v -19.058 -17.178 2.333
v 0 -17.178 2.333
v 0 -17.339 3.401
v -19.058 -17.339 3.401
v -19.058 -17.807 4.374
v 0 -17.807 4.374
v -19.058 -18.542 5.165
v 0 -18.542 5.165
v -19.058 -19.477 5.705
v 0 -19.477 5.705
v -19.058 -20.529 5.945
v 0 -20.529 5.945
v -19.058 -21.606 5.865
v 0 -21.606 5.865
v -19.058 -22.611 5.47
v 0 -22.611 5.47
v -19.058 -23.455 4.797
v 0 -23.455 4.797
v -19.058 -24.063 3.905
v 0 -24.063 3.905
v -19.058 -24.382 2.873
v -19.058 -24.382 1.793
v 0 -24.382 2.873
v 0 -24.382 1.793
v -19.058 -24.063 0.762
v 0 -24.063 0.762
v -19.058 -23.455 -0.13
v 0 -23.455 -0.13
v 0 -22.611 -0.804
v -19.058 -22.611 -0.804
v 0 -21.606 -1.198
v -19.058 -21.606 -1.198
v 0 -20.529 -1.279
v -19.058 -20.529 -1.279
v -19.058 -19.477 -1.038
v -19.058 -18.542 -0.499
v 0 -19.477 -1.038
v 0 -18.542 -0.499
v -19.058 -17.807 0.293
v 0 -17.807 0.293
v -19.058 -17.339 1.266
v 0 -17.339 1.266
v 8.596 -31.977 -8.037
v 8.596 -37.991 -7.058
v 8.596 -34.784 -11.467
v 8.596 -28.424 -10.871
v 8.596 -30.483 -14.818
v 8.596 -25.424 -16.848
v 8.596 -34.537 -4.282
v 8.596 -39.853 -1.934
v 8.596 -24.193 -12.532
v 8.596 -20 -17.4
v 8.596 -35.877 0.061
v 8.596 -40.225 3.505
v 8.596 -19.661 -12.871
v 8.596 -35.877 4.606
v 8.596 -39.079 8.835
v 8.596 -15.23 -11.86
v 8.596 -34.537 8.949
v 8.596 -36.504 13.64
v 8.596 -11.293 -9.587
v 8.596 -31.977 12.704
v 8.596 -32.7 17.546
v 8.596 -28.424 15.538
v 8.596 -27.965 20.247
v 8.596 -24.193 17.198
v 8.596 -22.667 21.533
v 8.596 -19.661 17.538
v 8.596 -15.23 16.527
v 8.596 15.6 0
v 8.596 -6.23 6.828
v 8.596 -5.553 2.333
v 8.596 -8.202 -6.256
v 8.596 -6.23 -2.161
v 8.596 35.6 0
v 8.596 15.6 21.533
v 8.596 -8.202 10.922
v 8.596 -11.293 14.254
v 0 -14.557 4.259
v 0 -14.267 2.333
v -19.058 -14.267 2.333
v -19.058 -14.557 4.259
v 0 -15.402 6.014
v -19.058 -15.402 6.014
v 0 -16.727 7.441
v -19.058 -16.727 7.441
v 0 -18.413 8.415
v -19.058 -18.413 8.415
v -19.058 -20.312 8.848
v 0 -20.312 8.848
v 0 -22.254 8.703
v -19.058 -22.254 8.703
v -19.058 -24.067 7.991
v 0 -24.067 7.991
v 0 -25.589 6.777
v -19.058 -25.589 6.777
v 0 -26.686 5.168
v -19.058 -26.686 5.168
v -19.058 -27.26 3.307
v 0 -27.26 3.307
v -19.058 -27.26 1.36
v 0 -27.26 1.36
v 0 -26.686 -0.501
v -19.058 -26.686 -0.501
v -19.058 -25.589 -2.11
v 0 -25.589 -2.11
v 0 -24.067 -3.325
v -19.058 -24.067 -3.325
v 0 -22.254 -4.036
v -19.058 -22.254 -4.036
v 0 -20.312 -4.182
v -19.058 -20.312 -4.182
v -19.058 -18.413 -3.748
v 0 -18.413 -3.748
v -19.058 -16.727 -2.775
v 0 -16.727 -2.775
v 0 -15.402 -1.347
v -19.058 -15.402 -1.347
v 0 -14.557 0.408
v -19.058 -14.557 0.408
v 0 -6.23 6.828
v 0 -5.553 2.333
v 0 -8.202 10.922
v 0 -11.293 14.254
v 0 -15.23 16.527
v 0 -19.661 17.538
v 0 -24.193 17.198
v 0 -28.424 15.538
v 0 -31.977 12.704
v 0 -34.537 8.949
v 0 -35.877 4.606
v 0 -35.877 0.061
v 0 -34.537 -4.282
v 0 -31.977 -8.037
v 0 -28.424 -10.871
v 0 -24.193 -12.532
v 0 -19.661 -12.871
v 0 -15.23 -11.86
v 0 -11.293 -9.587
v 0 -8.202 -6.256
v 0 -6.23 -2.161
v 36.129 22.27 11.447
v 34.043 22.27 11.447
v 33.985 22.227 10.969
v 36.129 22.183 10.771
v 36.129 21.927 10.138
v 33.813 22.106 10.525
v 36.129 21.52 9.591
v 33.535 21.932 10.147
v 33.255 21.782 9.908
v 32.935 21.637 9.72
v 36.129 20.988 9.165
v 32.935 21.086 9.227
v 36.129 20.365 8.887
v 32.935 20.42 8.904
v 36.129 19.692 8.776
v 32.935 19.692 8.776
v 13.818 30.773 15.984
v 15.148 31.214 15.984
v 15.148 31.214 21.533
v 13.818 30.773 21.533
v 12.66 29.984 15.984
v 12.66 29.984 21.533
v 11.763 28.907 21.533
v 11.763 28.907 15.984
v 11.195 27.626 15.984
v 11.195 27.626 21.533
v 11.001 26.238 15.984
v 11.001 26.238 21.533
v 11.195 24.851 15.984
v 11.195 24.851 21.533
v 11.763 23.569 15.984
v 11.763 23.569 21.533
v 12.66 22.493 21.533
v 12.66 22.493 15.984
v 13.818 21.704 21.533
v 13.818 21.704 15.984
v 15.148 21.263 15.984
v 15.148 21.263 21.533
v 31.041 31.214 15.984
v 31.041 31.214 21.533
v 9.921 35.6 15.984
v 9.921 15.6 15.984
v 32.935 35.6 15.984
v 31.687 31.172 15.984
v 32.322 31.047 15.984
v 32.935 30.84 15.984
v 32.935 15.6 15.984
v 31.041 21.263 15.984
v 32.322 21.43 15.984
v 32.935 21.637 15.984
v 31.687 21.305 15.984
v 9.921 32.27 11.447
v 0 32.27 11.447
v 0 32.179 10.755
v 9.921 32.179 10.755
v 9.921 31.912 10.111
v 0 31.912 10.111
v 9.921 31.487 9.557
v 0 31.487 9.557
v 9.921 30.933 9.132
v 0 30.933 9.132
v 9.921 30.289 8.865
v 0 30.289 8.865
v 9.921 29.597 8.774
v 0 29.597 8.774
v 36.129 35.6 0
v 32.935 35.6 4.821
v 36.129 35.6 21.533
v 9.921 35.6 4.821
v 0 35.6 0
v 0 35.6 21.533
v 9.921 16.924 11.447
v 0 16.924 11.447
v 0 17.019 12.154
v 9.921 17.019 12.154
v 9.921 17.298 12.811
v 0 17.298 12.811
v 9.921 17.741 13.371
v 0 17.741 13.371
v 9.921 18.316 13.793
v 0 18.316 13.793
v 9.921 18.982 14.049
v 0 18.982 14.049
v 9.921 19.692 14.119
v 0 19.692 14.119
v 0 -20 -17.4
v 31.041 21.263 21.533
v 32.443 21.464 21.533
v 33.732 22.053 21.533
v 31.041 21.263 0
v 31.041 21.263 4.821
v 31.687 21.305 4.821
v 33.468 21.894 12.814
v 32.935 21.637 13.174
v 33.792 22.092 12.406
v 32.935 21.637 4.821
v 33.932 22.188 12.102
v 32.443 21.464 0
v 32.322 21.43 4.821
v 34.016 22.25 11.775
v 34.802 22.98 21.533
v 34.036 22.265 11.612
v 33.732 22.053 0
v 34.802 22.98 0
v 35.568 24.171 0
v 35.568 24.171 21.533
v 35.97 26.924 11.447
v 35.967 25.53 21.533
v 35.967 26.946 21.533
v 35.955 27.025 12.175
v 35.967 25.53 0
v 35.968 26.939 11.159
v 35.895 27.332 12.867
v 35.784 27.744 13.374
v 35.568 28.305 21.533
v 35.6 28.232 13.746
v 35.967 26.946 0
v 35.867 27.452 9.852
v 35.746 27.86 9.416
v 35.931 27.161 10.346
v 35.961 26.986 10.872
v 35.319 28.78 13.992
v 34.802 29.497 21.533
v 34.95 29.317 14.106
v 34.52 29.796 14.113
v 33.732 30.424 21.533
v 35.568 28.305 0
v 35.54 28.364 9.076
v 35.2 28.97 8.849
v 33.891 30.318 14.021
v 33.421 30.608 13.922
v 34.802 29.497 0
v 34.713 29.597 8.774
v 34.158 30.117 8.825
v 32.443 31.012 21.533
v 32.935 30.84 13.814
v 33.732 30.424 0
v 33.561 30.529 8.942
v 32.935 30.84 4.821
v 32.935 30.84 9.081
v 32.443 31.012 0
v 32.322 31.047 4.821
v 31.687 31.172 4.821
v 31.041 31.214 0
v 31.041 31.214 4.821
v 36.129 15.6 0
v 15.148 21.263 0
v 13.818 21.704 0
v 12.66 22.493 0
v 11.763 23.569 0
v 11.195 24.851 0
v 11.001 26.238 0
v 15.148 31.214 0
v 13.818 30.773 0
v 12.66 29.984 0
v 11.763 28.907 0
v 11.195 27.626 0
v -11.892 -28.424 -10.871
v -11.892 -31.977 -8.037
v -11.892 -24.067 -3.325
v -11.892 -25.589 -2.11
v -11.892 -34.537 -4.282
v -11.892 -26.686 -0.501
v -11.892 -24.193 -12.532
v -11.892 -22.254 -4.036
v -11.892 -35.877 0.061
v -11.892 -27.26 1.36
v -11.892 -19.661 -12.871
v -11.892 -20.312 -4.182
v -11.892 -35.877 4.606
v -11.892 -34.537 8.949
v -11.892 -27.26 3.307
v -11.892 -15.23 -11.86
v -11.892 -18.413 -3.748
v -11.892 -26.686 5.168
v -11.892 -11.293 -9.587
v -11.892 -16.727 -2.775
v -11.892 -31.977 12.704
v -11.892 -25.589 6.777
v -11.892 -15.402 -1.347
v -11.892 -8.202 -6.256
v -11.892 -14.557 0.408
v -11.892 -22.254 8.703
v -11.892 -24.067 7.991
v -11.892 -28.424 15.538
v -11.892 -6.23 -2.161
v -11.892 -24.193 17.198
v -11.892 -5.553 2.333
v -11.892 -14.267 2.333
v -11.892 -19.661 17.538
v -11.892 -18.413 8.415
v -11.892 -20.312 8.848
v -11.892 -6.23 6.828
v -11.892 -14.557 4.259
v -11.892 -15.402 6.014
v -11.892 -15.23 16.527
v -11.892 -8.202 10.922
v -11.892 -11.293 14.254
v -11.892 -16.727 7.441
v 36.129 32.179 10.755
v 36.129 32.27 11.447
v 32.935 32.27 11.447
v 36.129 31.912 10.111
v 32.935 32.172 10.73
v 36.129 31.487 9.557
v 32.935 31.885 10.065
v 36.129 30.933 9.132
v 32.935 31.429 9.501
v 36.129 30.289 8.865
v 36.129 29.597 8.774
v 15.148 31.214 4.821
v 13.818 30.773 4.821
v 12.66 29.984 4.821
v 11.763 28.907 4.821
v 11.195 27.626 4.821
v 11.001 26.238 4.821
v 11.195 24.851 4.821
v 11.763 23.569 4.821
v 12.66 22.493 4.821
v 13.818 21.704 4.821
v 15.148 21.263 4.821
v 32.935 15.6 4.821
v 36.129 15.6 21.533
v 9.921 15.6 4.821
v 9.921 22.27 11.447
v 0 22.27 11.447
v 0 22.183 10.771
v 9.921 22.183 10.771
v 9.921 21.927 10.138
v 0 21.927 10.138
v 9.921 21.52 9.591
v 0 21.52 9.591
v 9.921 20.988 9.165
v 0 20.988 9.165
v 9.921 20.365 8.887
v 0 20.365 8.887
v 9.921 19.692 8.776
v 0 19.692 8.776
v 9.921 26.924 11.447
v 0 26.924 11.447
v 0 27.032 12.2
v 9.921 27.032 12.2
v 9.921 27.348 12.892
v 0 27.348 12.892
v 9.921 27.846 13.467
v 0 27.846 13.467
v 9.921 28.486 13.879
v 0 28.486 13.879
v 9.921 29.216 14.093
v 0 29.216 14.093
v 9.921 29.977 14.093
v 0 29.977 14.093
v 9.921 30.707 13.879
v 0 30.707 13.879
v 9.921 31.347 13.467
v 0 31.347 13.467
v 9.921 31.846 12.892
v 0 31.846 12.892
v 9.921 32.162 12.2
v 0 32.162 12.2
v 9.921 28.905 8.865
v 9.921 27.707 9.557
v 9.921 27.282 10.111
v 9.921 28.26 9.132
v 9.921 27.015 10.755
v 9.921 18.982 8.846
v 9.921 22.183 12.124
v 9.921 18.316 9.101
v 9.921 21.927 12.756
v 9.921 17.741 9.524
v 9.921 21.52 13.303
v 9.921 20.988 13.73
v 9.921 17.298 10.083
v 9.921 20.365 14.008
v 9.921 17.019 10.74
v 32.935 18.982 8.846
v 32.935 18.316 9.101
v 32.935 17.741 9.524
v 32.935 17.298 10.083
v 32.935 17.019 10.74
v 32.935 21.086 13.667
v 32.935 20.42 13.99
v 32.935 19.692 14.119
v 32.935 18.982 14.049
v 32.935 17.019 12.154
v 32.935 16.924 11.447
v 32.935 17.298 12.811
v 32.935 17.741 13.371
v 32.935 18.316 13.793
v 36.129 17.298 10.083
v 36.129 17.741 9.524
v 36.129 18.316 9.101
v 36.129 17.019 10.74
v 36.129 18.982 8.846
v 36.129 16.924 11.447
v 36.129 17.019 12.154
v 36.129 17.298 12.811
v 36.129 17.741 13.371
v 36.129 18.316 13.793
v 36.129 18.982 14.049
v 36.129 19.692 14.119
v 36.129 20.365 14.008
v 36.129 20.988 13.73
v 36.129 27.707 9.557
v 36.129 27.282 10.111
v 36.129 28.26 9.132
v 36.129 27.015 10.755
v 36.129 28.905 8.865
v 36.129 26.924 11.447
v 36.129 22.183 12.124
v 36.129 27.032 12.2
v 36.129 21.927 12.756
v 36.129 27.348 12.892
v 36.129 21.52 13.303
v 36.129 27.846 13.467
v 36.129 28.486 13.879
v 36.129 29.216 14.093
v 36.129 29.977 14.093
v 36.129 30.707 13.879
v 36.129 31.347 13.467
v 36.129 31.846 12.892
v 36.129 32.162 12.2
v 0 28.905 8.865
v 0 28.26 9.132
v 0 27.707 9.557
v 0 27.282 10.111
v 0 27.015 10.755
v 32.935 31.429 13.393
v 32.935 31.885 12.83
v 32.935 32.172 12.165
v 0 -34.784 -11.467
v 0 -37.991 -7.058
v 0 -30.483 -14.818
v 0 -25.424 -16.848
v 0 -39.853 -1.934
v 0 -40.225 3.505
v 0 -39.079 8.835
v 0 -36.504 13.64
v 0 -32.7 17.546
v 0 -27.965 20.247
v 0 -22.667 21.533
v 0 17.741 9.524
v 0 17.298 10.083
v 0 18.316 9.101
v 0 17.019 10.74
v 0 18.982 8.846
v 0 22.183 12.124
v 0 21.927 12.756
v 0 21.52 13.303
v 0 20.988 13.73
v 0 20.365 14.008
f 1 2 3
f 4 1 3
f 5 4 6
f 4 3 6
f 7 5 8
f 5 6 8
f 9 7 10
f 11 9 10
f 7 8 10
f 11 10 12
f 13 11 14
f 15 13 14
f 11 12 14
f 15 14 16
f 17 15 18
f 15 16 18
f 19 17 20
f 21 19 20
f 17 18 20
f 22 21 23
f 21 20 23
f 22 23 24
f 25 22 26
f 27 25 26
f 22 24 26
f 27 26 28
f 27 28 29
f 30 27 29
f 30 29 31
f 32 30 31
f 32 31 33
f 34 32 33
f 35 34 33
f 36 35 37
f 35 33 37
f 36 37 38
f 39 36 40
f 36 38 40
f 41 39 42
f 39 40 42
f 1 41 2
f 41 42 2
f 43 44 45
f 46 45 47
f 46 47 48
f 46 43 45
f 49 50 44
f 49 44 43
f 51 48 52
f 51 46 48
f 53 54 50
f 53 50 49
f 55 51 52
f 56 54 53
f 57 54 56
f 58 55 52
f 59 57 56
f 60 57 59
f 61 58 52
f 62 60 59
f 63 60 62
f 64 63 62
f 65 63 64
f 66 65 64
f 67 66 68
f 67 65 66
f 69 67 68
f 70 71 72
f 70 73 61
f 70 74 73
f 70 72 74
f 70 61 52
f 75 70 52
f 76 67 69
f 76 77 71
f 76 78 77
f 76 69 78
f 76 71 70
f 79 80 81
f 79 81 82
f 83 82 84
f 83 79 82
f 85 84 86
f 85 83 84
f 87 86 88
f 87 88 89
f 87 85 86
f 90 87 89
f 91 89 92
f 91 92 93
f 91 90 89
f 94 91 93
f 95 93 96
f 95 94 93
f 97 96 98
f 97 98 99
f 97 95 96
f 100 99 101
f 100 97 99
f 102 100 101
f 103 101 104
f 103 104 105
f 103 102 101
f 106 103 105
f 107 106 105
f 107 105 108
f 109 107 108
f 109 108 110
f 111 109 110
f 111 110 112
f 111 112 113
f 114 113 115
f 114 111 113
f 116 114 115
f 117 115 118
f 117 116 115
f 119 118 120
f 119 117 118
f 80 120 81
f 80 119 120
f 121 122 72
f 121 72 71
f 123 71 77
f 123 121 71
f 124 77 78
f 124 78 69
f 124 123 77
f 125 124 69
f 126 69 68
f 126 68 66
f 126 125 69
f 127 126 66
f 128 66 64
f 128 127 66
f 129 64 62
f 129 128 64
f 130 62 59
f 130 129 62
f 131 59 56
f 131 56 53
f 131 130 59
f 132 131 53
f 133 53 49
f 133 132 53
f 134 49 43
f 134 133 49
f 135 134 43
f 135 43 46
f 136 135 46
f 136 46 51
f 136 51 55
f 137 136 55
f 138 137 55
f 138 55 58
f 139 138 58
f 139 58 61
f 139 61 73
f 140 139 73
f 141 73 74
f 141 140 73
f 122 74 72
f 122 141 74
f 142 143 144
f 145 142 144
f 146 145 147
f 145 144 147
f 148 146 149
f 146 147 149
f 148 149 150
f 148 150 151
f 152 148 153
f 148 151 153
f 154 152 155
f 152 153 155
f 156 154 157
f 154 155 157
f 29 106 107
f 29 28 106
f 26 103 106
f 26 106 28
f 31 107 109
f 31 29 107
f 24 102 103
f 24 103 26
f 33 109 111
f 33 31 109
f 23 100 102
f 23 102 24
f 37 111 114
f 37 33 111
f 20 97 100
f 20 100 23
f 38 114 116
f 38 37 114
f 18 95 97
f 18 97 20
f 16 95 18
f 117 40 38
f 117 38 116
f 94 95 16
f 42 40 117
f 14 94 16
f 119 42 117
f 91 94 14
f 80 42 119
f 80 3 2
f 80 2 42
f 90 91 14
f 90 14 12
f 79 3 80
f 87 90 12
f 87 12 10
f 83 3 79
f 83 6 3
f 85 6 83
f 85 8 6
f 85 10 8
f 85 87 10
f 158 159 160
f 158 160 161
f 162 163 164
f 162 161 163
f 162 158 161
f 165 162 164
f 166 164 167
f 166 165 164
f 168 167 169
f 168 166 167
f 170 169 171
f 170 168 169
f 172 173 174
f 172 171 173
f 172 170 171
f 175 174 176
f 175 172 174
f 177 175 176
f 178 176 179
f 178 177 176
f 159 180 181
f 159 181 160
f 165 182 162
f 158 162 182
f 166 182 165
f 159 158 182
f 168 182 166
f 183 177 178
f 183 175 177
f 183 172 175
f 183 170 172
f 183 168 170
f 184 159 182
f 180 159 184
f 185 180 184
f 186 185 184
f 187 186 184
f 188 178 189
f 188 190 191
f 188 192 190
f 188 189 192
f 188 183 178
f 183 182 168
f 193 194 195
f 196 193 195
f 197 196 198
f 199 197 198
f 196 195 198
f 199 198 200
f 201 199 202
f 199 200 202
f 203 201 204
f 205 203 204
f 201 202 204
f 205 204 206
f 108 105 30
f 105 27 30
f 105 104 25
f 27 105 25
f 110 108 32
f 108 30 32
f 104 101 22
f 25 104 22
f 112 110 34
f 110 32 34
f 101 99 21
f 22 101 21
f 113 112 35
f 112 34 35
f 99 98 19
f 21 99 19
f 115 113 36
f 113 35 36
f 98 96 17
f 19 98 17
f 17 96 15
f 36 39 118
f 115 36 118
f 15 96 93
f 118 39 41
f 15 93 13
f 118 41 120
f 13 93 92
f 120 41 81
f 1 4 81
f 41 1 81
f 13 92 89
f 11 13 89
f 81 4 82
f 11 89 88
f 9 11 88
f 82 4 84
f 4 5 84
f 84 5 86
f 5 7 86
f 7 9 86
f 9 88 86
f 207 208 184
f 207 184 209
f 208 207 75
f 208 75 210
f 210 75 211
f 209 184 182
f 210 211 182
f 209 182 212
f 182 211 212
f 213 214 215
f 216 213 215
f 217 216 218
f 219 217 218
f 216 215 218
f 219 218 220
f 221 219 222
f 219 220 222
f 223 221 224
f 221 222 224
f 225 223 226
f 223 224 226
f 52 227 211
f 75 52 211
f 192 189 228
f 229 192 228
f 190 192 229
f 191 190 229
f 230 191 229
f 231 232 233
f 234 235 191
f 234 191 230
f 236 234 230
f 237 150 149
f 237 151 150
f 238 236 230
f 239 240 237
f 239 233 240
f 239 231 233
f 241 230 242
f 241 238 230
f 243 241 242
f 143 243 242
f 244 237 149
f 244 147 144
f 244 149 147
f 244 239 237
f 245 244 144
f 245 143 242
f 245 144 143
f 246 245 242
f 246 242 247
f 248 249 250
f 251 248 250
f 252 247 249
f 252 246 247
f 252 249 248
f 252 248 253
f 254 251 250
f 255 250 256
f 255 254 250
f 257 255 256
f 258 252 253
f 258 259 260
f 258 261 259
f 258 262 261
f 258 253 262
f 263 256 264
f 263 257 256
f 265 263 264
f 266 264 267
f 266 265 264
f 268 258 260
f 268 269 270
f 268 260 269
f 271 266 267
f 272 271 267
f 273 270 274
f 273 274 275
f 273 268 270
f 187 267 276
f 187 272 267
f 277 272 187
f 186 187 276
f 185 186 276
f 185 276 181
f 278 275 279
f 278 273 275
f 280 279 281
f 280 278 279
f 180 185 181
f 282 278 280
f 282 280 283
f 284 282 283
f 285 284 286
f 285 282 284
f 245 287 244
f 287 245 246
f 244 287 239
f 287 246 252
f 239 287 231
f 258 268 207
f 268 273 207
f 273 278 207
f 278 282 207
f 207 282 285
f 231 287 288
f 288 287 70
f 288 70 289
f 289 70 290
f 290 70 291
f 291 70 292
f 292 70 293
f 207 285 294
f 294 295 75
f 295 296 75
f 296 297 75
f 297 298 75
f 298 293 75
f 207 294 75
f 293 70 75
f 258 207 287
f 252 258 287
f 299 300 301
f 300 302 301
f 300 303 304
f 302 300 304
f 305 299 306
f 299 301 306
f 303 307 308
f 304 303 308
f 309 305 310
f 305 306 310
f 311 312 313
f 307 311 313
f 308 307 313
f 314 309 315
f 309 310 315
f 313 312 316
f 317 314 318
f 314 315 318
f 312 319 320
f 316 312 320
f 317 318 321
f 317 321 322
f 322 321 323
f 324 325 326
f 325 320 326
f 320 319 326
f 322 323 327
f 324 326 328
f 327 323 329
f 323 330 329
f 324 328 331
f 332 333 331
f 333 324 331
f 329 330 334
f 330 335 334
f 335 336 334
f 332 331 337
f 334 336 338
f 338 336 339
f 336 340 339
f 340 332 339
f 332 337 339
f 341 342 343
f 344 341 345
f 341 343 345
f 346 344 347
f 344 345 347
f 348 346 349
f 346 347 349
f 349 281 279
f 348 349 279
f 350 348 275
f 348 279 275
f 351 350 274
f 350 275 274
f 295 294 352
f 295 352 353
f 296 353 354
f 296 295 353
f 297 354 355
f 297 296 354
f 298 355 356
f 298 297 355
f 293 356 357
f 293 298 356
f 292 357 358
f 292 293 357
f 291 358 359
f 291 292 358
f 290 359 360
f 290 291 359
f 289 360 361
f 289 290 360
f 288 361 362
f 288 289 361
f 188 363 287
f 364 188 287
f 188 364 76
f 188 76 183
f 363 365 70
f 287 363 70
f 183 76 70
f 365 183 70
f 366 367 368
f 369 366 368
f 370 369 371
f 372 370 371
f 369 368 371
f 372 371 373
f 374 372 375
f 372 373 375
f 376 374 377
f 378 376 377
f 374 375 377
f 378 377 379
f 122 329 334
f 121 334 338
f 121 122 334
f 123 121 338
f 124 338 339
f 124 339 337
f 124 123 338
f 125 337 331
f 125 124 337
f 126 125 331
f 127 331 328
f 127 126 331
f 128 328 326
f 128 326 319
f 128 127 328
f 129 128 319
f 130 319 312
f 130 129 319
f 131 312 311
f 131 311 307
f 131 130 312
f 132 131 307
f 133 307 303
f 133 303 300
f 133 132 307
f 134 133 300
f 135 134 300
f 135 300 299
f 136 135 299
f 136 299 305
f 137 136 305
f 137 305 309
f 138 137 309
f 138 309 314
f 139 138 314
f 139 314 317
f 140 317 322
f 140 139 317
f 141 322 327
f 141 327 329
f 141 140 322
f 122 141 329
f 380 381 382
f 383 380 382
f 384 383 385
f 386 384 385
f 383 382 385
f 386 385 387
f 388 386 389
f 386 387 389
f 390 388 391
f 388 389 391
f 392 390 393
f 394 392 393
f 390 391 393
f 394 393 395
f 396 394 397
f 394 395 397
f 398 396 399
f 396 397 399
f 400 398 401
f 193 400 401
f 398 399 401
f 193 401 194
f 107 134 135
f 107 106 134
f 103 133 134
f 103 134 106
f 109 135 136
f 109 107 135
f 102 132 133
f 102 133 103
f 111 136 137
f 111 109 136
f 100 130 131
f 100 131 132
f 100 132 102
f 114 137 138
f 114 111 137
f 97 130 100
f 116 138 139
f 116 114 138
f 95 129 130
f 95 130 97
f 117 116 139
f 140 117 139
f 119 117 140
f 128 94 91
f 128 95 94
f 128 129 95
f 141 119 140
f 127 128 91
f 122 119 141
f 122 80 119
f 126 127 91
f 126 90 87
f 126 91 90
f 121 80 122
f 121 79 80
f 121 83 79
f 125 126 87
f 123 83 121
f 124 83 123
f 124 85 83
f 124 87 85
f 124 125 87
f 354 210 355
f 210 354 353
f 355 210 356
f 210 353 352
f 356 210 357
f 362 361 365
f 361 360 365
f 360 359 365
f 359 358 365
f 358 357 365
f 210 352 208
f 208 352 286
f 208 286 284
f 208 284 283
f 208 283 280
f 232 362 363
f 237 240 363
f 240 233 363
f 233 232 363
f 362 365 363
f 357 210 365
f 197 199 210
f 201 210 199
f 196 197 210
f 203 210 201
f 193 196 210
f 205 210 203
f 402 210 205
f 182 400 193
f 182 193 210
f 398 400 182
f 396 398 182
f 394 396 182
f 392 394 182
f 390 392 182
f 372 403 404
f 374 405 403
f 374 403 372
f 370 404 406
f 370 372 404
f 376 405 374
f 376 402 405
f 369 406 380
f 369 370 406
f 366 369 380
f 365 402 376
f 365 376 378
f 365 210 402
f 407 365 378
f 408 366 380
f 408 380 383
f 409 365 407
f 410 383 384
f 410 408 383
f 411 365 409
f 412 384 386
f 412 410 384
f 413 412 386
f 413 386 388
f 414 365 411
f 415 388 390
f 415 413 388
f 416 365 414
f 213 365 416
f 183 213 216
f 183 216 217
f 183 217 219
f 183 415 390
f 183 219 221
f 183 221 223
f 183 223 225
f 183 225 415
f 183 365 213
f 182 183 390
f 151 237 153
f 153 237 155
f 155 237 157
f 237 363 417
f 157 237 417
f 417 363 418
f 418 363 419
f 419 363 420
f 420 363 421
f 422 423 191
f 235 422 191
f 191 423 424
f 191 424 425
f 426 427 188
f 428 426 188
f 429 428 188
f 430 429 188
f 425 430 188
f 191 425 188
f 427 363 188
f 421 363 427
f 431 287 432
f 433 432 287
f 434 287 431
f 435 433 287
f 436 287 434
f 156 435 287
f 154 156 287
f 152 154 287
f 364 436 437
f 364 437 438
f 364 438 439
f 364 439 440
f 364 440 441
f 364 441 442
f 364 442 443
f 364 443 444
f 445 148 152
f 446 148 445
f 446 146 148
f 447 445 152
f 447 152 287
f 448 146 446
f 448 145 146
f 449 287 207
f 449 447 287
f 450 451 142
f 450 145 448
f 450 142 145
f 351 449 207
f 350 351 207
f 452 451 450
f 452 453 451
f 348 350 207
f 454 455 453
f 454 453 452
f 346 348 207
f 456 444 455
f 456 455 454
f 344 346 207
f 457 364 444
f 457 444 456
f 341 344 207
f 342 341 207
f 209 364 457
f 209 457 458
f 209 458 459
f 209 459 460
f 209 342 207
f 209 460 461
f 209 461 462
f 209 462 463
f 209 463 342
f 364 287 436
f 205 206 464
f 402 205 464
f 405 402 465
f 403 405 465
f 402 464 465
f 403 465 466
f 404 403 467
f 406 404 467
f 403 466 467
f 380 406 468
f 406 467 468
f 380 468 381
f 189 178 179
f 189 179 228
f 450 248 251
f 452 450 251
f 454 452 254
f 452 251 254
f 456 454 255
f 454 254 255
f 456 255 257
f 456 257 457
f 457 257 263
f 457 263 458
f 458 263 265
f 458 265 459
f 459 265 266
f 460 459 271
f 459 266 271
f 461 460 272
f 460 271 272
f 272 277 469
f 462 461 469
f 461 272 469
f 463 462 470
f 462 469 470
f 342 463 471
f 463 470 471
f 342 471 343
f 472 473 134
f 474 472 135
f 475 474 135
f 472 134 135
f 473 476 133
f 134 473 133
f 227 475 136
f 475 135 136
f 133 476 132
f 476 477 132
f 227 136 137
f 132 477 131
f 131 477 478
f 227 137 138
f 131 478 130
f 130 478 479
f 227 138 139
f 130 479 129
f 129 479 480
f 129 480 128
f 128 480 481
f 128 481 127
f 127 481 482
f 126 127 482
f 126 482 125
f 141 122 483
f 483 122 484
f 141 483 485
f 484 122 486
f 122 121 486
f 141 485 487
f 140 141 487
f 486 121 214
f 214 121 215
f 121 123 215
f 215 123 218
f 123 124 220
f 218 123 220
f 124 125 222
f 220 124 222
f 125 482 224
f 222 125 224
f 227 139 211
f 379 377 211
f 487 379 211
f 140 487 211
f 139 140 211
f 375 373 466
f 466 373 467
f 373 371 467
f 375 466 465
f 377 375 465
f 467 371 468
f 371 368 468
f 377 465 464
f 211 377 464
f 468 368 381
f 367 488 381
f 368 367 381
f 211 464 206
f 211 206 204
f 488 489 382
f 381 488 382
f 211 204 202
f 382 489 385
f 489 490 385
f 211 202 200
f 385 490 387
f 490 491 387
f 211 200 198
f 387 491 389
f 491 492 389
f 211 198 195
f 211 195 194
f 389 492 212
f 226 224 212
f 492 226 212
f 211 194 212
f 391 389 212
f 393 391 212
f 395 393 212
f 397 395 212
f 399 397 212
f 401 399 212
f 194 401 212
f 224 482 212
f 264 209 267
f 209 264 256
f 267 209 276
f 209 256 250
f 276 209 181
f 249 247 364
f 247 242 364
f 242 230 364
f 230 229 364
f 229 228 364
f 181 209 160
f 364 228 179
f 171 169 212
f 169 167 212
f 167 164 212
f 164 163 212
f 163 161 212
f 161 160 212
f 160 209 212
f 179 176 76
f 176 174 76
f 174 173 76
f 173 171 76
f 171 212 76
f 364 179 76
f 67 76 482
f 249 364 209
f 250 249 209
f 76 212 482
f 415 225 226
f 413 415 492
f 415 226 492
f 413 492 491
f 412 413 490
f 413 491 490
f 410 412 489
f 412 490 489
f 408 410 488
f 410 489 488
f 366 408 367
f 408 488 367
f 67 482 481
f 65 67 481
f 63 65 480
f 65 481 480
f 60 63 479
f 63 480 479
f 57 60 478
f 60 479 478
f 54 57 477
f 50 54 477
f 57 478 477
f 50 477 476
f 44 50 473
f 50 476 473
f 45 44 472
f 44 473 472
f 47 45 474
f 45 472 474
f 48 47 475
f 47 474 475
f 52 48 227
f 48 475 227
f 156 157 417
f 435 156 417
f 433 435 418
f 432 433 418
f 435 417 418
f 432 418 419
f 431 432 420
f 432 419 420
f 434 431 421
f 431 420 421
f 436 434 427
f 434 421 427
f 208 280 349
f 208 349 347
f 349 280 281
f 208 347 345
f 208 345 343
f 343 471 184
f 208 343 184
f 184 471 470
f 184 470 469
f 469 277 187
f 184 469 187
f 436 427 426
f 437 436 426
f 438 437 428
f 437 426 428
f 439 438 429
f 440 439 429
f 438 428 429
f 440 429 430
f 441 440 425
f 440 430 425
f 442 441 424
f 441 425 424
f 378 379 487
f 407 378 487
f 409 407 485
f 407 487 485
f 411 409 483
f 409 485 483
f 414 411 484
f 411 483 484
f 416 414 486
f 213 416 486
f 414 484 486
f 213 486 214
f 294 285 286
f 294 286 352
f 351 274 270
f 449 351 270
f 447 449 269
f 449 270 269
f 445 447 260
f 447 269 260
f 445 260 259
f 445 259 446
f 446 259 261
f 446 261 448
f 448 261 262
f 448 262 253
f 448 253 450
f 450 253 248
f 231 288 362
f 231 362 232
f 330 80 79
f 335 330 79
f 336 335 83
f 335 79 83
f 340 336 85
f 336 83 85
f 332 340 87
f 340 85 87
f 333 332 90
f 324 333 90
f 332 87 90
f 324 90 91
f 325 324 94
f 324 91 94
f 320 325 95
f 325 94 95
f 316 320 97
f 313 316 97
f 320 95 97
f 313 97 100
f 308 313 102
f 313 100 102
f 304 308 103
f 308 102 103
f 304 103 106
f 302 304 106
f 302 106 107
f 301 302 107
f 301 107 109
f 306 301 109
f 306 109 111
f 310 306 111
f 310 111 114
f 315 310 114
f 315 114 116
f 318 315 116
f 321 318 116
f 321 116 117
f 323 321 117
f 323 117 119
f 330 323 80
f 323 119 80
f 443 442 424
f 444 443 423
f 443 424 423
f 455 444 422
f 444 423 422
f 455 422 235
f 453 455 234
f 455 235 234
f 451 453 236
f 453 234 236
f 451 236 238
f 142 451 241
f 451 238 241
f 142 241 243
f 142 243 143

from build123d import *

# Parameters (mm, degrees)
F0_R     = 6.533334
F0_R_2   = 3.622154
F1_DEPTH = 19.05759
F0_R_3   = 15.247295
F2_DEPTH = 11.89196
F3_DEPTH = 8.59584
F4_DEPTH = 36.12852
F6_DEPTH = 22.58512
F7_W     = 23.013976
F7_H     = 11.163496
F8_DEPTH = 25


with BuildPart() as f1:
    # F0 (on Right) → F1 (new body)
    with BuildSketch(Plane.YZ):
        with Locations((-20.800001, 2.333333)):
            Circle(F0_R)
        with Locations((-20.800001, 2.333333)):
            Circle(F0_R_2, mode=Mode.SUBTRACT)
    extrude(amount=-F1_DEPTH)


with BuildPart() as f2:
    # F0 (on Right) → F2 (new body)
    with BuildSketch(Plane.YZ):
        with Locations((-20.800001, 2.333333)):
            Circle(F0_R_3)
        with Locations((-20.800001, 2.333333)):
            Circle(F0_R, mode=Mode.SUBTRACT)
    extrude(amount=-F2_DEPTH)


with BuildPart() as f3:
    # F0 (on Right) → F3 (new body)
    with BuildSketch(Plane.YZ):
        with BuildLine():
            Line((15.600001, 21.533335), (-22.666668, 21.533335))
            ThreePointArc((-22.666668, 21.533335), (-40.229854, 0.772385), (-20.000002, -17.400001))
            Line((-20.000002, -17.400001), (35.600001, 0))
            Line((35.600001, 0), (15.600001, 0))
            Line((15.600001, 0), (15.600001, 13.4))
            Line((15.600001, 13.4), (15.600001, 21.533335))
        make_face()
        with Locations((-20.800001, 2.333333)):
            Circle(F0_R_3, mode=Mode.SUBTRACT)
    extrude(amount=F3_DEPTH)

    # F0 (on Right) → F4 (join)
    with BuildSketch(Plane.YZ):
        Polygon((35.600001, 21.533335), (15.600001, 21.533335), (15.600001, 13.4), (15.600001, 0), (35.600001, 0), align=None)
        with BuildLine():
            ThreePointArc((19.692099, 14.118616), (21.520351, 13.303437), (22.269885, 11.447306))
            ThreePointArc((22.269885, 11.447306), (21.520351, 9.591176), (19.692099, 8.775996))
            ThreePointArc((19.692099, 8.775996), (17.740748, 9.523834), (16.923872, 11.447306))
            ThreePointArc((16.923872, 11.447306), (17.740748, 13.370778), (19.692099, 14.118616))
        make_face(mode=Mode.SUBTRACT)
        with BuildLine():
            ThreePointArc((26.923872, 11.447306), (29.596879, 14.120312), (32.269885, 11.447306))
            ThreePointArc((32.269885, 11.447306), (31.486979, 9.557205), (29.596879, 8.7743))
            ThreePointArc((29.596879, 8.7743), (27.706778, 9.557205), (26.923872, 11.447306))
        make_face(mode=Mode.SUBTRACT)
    extrude(amount=F4_DEPTH)

    # F5 (on Top) → F6 (cut)
    with BuildSketch(Plane.XY):
        with BuildLine():
            ThreePointArc((31.041456, 21.262659), (36.017147, 26.238349), (31.041456, 31.21404))
            Line((31.041456, 31.21404), (15.147886, 31.21404))
            ThreePointArc((15.147886, 31.21404), (11.001104, 26.238349), (15.147886, 21.262659))
            Line((15.147886, 21.262659), (31.041456, 21.262659))
        make_face()
    extrude(amount=F6_DEPTH, mode=Mode.SUBTRACT)

    # F7 (on face) → F8 (cut)
    with BuildSketch(Plane.XZ.offset(-15.600001)):
        with Locations((21.427715, 10.402655)):
            Rectangle(F7_W, F7_H)
    extrude(amount=-F8_DEPTH, mode=Mode.SUBTRACT)


solid = Compound([f1.part, f2.part, f3.part])
